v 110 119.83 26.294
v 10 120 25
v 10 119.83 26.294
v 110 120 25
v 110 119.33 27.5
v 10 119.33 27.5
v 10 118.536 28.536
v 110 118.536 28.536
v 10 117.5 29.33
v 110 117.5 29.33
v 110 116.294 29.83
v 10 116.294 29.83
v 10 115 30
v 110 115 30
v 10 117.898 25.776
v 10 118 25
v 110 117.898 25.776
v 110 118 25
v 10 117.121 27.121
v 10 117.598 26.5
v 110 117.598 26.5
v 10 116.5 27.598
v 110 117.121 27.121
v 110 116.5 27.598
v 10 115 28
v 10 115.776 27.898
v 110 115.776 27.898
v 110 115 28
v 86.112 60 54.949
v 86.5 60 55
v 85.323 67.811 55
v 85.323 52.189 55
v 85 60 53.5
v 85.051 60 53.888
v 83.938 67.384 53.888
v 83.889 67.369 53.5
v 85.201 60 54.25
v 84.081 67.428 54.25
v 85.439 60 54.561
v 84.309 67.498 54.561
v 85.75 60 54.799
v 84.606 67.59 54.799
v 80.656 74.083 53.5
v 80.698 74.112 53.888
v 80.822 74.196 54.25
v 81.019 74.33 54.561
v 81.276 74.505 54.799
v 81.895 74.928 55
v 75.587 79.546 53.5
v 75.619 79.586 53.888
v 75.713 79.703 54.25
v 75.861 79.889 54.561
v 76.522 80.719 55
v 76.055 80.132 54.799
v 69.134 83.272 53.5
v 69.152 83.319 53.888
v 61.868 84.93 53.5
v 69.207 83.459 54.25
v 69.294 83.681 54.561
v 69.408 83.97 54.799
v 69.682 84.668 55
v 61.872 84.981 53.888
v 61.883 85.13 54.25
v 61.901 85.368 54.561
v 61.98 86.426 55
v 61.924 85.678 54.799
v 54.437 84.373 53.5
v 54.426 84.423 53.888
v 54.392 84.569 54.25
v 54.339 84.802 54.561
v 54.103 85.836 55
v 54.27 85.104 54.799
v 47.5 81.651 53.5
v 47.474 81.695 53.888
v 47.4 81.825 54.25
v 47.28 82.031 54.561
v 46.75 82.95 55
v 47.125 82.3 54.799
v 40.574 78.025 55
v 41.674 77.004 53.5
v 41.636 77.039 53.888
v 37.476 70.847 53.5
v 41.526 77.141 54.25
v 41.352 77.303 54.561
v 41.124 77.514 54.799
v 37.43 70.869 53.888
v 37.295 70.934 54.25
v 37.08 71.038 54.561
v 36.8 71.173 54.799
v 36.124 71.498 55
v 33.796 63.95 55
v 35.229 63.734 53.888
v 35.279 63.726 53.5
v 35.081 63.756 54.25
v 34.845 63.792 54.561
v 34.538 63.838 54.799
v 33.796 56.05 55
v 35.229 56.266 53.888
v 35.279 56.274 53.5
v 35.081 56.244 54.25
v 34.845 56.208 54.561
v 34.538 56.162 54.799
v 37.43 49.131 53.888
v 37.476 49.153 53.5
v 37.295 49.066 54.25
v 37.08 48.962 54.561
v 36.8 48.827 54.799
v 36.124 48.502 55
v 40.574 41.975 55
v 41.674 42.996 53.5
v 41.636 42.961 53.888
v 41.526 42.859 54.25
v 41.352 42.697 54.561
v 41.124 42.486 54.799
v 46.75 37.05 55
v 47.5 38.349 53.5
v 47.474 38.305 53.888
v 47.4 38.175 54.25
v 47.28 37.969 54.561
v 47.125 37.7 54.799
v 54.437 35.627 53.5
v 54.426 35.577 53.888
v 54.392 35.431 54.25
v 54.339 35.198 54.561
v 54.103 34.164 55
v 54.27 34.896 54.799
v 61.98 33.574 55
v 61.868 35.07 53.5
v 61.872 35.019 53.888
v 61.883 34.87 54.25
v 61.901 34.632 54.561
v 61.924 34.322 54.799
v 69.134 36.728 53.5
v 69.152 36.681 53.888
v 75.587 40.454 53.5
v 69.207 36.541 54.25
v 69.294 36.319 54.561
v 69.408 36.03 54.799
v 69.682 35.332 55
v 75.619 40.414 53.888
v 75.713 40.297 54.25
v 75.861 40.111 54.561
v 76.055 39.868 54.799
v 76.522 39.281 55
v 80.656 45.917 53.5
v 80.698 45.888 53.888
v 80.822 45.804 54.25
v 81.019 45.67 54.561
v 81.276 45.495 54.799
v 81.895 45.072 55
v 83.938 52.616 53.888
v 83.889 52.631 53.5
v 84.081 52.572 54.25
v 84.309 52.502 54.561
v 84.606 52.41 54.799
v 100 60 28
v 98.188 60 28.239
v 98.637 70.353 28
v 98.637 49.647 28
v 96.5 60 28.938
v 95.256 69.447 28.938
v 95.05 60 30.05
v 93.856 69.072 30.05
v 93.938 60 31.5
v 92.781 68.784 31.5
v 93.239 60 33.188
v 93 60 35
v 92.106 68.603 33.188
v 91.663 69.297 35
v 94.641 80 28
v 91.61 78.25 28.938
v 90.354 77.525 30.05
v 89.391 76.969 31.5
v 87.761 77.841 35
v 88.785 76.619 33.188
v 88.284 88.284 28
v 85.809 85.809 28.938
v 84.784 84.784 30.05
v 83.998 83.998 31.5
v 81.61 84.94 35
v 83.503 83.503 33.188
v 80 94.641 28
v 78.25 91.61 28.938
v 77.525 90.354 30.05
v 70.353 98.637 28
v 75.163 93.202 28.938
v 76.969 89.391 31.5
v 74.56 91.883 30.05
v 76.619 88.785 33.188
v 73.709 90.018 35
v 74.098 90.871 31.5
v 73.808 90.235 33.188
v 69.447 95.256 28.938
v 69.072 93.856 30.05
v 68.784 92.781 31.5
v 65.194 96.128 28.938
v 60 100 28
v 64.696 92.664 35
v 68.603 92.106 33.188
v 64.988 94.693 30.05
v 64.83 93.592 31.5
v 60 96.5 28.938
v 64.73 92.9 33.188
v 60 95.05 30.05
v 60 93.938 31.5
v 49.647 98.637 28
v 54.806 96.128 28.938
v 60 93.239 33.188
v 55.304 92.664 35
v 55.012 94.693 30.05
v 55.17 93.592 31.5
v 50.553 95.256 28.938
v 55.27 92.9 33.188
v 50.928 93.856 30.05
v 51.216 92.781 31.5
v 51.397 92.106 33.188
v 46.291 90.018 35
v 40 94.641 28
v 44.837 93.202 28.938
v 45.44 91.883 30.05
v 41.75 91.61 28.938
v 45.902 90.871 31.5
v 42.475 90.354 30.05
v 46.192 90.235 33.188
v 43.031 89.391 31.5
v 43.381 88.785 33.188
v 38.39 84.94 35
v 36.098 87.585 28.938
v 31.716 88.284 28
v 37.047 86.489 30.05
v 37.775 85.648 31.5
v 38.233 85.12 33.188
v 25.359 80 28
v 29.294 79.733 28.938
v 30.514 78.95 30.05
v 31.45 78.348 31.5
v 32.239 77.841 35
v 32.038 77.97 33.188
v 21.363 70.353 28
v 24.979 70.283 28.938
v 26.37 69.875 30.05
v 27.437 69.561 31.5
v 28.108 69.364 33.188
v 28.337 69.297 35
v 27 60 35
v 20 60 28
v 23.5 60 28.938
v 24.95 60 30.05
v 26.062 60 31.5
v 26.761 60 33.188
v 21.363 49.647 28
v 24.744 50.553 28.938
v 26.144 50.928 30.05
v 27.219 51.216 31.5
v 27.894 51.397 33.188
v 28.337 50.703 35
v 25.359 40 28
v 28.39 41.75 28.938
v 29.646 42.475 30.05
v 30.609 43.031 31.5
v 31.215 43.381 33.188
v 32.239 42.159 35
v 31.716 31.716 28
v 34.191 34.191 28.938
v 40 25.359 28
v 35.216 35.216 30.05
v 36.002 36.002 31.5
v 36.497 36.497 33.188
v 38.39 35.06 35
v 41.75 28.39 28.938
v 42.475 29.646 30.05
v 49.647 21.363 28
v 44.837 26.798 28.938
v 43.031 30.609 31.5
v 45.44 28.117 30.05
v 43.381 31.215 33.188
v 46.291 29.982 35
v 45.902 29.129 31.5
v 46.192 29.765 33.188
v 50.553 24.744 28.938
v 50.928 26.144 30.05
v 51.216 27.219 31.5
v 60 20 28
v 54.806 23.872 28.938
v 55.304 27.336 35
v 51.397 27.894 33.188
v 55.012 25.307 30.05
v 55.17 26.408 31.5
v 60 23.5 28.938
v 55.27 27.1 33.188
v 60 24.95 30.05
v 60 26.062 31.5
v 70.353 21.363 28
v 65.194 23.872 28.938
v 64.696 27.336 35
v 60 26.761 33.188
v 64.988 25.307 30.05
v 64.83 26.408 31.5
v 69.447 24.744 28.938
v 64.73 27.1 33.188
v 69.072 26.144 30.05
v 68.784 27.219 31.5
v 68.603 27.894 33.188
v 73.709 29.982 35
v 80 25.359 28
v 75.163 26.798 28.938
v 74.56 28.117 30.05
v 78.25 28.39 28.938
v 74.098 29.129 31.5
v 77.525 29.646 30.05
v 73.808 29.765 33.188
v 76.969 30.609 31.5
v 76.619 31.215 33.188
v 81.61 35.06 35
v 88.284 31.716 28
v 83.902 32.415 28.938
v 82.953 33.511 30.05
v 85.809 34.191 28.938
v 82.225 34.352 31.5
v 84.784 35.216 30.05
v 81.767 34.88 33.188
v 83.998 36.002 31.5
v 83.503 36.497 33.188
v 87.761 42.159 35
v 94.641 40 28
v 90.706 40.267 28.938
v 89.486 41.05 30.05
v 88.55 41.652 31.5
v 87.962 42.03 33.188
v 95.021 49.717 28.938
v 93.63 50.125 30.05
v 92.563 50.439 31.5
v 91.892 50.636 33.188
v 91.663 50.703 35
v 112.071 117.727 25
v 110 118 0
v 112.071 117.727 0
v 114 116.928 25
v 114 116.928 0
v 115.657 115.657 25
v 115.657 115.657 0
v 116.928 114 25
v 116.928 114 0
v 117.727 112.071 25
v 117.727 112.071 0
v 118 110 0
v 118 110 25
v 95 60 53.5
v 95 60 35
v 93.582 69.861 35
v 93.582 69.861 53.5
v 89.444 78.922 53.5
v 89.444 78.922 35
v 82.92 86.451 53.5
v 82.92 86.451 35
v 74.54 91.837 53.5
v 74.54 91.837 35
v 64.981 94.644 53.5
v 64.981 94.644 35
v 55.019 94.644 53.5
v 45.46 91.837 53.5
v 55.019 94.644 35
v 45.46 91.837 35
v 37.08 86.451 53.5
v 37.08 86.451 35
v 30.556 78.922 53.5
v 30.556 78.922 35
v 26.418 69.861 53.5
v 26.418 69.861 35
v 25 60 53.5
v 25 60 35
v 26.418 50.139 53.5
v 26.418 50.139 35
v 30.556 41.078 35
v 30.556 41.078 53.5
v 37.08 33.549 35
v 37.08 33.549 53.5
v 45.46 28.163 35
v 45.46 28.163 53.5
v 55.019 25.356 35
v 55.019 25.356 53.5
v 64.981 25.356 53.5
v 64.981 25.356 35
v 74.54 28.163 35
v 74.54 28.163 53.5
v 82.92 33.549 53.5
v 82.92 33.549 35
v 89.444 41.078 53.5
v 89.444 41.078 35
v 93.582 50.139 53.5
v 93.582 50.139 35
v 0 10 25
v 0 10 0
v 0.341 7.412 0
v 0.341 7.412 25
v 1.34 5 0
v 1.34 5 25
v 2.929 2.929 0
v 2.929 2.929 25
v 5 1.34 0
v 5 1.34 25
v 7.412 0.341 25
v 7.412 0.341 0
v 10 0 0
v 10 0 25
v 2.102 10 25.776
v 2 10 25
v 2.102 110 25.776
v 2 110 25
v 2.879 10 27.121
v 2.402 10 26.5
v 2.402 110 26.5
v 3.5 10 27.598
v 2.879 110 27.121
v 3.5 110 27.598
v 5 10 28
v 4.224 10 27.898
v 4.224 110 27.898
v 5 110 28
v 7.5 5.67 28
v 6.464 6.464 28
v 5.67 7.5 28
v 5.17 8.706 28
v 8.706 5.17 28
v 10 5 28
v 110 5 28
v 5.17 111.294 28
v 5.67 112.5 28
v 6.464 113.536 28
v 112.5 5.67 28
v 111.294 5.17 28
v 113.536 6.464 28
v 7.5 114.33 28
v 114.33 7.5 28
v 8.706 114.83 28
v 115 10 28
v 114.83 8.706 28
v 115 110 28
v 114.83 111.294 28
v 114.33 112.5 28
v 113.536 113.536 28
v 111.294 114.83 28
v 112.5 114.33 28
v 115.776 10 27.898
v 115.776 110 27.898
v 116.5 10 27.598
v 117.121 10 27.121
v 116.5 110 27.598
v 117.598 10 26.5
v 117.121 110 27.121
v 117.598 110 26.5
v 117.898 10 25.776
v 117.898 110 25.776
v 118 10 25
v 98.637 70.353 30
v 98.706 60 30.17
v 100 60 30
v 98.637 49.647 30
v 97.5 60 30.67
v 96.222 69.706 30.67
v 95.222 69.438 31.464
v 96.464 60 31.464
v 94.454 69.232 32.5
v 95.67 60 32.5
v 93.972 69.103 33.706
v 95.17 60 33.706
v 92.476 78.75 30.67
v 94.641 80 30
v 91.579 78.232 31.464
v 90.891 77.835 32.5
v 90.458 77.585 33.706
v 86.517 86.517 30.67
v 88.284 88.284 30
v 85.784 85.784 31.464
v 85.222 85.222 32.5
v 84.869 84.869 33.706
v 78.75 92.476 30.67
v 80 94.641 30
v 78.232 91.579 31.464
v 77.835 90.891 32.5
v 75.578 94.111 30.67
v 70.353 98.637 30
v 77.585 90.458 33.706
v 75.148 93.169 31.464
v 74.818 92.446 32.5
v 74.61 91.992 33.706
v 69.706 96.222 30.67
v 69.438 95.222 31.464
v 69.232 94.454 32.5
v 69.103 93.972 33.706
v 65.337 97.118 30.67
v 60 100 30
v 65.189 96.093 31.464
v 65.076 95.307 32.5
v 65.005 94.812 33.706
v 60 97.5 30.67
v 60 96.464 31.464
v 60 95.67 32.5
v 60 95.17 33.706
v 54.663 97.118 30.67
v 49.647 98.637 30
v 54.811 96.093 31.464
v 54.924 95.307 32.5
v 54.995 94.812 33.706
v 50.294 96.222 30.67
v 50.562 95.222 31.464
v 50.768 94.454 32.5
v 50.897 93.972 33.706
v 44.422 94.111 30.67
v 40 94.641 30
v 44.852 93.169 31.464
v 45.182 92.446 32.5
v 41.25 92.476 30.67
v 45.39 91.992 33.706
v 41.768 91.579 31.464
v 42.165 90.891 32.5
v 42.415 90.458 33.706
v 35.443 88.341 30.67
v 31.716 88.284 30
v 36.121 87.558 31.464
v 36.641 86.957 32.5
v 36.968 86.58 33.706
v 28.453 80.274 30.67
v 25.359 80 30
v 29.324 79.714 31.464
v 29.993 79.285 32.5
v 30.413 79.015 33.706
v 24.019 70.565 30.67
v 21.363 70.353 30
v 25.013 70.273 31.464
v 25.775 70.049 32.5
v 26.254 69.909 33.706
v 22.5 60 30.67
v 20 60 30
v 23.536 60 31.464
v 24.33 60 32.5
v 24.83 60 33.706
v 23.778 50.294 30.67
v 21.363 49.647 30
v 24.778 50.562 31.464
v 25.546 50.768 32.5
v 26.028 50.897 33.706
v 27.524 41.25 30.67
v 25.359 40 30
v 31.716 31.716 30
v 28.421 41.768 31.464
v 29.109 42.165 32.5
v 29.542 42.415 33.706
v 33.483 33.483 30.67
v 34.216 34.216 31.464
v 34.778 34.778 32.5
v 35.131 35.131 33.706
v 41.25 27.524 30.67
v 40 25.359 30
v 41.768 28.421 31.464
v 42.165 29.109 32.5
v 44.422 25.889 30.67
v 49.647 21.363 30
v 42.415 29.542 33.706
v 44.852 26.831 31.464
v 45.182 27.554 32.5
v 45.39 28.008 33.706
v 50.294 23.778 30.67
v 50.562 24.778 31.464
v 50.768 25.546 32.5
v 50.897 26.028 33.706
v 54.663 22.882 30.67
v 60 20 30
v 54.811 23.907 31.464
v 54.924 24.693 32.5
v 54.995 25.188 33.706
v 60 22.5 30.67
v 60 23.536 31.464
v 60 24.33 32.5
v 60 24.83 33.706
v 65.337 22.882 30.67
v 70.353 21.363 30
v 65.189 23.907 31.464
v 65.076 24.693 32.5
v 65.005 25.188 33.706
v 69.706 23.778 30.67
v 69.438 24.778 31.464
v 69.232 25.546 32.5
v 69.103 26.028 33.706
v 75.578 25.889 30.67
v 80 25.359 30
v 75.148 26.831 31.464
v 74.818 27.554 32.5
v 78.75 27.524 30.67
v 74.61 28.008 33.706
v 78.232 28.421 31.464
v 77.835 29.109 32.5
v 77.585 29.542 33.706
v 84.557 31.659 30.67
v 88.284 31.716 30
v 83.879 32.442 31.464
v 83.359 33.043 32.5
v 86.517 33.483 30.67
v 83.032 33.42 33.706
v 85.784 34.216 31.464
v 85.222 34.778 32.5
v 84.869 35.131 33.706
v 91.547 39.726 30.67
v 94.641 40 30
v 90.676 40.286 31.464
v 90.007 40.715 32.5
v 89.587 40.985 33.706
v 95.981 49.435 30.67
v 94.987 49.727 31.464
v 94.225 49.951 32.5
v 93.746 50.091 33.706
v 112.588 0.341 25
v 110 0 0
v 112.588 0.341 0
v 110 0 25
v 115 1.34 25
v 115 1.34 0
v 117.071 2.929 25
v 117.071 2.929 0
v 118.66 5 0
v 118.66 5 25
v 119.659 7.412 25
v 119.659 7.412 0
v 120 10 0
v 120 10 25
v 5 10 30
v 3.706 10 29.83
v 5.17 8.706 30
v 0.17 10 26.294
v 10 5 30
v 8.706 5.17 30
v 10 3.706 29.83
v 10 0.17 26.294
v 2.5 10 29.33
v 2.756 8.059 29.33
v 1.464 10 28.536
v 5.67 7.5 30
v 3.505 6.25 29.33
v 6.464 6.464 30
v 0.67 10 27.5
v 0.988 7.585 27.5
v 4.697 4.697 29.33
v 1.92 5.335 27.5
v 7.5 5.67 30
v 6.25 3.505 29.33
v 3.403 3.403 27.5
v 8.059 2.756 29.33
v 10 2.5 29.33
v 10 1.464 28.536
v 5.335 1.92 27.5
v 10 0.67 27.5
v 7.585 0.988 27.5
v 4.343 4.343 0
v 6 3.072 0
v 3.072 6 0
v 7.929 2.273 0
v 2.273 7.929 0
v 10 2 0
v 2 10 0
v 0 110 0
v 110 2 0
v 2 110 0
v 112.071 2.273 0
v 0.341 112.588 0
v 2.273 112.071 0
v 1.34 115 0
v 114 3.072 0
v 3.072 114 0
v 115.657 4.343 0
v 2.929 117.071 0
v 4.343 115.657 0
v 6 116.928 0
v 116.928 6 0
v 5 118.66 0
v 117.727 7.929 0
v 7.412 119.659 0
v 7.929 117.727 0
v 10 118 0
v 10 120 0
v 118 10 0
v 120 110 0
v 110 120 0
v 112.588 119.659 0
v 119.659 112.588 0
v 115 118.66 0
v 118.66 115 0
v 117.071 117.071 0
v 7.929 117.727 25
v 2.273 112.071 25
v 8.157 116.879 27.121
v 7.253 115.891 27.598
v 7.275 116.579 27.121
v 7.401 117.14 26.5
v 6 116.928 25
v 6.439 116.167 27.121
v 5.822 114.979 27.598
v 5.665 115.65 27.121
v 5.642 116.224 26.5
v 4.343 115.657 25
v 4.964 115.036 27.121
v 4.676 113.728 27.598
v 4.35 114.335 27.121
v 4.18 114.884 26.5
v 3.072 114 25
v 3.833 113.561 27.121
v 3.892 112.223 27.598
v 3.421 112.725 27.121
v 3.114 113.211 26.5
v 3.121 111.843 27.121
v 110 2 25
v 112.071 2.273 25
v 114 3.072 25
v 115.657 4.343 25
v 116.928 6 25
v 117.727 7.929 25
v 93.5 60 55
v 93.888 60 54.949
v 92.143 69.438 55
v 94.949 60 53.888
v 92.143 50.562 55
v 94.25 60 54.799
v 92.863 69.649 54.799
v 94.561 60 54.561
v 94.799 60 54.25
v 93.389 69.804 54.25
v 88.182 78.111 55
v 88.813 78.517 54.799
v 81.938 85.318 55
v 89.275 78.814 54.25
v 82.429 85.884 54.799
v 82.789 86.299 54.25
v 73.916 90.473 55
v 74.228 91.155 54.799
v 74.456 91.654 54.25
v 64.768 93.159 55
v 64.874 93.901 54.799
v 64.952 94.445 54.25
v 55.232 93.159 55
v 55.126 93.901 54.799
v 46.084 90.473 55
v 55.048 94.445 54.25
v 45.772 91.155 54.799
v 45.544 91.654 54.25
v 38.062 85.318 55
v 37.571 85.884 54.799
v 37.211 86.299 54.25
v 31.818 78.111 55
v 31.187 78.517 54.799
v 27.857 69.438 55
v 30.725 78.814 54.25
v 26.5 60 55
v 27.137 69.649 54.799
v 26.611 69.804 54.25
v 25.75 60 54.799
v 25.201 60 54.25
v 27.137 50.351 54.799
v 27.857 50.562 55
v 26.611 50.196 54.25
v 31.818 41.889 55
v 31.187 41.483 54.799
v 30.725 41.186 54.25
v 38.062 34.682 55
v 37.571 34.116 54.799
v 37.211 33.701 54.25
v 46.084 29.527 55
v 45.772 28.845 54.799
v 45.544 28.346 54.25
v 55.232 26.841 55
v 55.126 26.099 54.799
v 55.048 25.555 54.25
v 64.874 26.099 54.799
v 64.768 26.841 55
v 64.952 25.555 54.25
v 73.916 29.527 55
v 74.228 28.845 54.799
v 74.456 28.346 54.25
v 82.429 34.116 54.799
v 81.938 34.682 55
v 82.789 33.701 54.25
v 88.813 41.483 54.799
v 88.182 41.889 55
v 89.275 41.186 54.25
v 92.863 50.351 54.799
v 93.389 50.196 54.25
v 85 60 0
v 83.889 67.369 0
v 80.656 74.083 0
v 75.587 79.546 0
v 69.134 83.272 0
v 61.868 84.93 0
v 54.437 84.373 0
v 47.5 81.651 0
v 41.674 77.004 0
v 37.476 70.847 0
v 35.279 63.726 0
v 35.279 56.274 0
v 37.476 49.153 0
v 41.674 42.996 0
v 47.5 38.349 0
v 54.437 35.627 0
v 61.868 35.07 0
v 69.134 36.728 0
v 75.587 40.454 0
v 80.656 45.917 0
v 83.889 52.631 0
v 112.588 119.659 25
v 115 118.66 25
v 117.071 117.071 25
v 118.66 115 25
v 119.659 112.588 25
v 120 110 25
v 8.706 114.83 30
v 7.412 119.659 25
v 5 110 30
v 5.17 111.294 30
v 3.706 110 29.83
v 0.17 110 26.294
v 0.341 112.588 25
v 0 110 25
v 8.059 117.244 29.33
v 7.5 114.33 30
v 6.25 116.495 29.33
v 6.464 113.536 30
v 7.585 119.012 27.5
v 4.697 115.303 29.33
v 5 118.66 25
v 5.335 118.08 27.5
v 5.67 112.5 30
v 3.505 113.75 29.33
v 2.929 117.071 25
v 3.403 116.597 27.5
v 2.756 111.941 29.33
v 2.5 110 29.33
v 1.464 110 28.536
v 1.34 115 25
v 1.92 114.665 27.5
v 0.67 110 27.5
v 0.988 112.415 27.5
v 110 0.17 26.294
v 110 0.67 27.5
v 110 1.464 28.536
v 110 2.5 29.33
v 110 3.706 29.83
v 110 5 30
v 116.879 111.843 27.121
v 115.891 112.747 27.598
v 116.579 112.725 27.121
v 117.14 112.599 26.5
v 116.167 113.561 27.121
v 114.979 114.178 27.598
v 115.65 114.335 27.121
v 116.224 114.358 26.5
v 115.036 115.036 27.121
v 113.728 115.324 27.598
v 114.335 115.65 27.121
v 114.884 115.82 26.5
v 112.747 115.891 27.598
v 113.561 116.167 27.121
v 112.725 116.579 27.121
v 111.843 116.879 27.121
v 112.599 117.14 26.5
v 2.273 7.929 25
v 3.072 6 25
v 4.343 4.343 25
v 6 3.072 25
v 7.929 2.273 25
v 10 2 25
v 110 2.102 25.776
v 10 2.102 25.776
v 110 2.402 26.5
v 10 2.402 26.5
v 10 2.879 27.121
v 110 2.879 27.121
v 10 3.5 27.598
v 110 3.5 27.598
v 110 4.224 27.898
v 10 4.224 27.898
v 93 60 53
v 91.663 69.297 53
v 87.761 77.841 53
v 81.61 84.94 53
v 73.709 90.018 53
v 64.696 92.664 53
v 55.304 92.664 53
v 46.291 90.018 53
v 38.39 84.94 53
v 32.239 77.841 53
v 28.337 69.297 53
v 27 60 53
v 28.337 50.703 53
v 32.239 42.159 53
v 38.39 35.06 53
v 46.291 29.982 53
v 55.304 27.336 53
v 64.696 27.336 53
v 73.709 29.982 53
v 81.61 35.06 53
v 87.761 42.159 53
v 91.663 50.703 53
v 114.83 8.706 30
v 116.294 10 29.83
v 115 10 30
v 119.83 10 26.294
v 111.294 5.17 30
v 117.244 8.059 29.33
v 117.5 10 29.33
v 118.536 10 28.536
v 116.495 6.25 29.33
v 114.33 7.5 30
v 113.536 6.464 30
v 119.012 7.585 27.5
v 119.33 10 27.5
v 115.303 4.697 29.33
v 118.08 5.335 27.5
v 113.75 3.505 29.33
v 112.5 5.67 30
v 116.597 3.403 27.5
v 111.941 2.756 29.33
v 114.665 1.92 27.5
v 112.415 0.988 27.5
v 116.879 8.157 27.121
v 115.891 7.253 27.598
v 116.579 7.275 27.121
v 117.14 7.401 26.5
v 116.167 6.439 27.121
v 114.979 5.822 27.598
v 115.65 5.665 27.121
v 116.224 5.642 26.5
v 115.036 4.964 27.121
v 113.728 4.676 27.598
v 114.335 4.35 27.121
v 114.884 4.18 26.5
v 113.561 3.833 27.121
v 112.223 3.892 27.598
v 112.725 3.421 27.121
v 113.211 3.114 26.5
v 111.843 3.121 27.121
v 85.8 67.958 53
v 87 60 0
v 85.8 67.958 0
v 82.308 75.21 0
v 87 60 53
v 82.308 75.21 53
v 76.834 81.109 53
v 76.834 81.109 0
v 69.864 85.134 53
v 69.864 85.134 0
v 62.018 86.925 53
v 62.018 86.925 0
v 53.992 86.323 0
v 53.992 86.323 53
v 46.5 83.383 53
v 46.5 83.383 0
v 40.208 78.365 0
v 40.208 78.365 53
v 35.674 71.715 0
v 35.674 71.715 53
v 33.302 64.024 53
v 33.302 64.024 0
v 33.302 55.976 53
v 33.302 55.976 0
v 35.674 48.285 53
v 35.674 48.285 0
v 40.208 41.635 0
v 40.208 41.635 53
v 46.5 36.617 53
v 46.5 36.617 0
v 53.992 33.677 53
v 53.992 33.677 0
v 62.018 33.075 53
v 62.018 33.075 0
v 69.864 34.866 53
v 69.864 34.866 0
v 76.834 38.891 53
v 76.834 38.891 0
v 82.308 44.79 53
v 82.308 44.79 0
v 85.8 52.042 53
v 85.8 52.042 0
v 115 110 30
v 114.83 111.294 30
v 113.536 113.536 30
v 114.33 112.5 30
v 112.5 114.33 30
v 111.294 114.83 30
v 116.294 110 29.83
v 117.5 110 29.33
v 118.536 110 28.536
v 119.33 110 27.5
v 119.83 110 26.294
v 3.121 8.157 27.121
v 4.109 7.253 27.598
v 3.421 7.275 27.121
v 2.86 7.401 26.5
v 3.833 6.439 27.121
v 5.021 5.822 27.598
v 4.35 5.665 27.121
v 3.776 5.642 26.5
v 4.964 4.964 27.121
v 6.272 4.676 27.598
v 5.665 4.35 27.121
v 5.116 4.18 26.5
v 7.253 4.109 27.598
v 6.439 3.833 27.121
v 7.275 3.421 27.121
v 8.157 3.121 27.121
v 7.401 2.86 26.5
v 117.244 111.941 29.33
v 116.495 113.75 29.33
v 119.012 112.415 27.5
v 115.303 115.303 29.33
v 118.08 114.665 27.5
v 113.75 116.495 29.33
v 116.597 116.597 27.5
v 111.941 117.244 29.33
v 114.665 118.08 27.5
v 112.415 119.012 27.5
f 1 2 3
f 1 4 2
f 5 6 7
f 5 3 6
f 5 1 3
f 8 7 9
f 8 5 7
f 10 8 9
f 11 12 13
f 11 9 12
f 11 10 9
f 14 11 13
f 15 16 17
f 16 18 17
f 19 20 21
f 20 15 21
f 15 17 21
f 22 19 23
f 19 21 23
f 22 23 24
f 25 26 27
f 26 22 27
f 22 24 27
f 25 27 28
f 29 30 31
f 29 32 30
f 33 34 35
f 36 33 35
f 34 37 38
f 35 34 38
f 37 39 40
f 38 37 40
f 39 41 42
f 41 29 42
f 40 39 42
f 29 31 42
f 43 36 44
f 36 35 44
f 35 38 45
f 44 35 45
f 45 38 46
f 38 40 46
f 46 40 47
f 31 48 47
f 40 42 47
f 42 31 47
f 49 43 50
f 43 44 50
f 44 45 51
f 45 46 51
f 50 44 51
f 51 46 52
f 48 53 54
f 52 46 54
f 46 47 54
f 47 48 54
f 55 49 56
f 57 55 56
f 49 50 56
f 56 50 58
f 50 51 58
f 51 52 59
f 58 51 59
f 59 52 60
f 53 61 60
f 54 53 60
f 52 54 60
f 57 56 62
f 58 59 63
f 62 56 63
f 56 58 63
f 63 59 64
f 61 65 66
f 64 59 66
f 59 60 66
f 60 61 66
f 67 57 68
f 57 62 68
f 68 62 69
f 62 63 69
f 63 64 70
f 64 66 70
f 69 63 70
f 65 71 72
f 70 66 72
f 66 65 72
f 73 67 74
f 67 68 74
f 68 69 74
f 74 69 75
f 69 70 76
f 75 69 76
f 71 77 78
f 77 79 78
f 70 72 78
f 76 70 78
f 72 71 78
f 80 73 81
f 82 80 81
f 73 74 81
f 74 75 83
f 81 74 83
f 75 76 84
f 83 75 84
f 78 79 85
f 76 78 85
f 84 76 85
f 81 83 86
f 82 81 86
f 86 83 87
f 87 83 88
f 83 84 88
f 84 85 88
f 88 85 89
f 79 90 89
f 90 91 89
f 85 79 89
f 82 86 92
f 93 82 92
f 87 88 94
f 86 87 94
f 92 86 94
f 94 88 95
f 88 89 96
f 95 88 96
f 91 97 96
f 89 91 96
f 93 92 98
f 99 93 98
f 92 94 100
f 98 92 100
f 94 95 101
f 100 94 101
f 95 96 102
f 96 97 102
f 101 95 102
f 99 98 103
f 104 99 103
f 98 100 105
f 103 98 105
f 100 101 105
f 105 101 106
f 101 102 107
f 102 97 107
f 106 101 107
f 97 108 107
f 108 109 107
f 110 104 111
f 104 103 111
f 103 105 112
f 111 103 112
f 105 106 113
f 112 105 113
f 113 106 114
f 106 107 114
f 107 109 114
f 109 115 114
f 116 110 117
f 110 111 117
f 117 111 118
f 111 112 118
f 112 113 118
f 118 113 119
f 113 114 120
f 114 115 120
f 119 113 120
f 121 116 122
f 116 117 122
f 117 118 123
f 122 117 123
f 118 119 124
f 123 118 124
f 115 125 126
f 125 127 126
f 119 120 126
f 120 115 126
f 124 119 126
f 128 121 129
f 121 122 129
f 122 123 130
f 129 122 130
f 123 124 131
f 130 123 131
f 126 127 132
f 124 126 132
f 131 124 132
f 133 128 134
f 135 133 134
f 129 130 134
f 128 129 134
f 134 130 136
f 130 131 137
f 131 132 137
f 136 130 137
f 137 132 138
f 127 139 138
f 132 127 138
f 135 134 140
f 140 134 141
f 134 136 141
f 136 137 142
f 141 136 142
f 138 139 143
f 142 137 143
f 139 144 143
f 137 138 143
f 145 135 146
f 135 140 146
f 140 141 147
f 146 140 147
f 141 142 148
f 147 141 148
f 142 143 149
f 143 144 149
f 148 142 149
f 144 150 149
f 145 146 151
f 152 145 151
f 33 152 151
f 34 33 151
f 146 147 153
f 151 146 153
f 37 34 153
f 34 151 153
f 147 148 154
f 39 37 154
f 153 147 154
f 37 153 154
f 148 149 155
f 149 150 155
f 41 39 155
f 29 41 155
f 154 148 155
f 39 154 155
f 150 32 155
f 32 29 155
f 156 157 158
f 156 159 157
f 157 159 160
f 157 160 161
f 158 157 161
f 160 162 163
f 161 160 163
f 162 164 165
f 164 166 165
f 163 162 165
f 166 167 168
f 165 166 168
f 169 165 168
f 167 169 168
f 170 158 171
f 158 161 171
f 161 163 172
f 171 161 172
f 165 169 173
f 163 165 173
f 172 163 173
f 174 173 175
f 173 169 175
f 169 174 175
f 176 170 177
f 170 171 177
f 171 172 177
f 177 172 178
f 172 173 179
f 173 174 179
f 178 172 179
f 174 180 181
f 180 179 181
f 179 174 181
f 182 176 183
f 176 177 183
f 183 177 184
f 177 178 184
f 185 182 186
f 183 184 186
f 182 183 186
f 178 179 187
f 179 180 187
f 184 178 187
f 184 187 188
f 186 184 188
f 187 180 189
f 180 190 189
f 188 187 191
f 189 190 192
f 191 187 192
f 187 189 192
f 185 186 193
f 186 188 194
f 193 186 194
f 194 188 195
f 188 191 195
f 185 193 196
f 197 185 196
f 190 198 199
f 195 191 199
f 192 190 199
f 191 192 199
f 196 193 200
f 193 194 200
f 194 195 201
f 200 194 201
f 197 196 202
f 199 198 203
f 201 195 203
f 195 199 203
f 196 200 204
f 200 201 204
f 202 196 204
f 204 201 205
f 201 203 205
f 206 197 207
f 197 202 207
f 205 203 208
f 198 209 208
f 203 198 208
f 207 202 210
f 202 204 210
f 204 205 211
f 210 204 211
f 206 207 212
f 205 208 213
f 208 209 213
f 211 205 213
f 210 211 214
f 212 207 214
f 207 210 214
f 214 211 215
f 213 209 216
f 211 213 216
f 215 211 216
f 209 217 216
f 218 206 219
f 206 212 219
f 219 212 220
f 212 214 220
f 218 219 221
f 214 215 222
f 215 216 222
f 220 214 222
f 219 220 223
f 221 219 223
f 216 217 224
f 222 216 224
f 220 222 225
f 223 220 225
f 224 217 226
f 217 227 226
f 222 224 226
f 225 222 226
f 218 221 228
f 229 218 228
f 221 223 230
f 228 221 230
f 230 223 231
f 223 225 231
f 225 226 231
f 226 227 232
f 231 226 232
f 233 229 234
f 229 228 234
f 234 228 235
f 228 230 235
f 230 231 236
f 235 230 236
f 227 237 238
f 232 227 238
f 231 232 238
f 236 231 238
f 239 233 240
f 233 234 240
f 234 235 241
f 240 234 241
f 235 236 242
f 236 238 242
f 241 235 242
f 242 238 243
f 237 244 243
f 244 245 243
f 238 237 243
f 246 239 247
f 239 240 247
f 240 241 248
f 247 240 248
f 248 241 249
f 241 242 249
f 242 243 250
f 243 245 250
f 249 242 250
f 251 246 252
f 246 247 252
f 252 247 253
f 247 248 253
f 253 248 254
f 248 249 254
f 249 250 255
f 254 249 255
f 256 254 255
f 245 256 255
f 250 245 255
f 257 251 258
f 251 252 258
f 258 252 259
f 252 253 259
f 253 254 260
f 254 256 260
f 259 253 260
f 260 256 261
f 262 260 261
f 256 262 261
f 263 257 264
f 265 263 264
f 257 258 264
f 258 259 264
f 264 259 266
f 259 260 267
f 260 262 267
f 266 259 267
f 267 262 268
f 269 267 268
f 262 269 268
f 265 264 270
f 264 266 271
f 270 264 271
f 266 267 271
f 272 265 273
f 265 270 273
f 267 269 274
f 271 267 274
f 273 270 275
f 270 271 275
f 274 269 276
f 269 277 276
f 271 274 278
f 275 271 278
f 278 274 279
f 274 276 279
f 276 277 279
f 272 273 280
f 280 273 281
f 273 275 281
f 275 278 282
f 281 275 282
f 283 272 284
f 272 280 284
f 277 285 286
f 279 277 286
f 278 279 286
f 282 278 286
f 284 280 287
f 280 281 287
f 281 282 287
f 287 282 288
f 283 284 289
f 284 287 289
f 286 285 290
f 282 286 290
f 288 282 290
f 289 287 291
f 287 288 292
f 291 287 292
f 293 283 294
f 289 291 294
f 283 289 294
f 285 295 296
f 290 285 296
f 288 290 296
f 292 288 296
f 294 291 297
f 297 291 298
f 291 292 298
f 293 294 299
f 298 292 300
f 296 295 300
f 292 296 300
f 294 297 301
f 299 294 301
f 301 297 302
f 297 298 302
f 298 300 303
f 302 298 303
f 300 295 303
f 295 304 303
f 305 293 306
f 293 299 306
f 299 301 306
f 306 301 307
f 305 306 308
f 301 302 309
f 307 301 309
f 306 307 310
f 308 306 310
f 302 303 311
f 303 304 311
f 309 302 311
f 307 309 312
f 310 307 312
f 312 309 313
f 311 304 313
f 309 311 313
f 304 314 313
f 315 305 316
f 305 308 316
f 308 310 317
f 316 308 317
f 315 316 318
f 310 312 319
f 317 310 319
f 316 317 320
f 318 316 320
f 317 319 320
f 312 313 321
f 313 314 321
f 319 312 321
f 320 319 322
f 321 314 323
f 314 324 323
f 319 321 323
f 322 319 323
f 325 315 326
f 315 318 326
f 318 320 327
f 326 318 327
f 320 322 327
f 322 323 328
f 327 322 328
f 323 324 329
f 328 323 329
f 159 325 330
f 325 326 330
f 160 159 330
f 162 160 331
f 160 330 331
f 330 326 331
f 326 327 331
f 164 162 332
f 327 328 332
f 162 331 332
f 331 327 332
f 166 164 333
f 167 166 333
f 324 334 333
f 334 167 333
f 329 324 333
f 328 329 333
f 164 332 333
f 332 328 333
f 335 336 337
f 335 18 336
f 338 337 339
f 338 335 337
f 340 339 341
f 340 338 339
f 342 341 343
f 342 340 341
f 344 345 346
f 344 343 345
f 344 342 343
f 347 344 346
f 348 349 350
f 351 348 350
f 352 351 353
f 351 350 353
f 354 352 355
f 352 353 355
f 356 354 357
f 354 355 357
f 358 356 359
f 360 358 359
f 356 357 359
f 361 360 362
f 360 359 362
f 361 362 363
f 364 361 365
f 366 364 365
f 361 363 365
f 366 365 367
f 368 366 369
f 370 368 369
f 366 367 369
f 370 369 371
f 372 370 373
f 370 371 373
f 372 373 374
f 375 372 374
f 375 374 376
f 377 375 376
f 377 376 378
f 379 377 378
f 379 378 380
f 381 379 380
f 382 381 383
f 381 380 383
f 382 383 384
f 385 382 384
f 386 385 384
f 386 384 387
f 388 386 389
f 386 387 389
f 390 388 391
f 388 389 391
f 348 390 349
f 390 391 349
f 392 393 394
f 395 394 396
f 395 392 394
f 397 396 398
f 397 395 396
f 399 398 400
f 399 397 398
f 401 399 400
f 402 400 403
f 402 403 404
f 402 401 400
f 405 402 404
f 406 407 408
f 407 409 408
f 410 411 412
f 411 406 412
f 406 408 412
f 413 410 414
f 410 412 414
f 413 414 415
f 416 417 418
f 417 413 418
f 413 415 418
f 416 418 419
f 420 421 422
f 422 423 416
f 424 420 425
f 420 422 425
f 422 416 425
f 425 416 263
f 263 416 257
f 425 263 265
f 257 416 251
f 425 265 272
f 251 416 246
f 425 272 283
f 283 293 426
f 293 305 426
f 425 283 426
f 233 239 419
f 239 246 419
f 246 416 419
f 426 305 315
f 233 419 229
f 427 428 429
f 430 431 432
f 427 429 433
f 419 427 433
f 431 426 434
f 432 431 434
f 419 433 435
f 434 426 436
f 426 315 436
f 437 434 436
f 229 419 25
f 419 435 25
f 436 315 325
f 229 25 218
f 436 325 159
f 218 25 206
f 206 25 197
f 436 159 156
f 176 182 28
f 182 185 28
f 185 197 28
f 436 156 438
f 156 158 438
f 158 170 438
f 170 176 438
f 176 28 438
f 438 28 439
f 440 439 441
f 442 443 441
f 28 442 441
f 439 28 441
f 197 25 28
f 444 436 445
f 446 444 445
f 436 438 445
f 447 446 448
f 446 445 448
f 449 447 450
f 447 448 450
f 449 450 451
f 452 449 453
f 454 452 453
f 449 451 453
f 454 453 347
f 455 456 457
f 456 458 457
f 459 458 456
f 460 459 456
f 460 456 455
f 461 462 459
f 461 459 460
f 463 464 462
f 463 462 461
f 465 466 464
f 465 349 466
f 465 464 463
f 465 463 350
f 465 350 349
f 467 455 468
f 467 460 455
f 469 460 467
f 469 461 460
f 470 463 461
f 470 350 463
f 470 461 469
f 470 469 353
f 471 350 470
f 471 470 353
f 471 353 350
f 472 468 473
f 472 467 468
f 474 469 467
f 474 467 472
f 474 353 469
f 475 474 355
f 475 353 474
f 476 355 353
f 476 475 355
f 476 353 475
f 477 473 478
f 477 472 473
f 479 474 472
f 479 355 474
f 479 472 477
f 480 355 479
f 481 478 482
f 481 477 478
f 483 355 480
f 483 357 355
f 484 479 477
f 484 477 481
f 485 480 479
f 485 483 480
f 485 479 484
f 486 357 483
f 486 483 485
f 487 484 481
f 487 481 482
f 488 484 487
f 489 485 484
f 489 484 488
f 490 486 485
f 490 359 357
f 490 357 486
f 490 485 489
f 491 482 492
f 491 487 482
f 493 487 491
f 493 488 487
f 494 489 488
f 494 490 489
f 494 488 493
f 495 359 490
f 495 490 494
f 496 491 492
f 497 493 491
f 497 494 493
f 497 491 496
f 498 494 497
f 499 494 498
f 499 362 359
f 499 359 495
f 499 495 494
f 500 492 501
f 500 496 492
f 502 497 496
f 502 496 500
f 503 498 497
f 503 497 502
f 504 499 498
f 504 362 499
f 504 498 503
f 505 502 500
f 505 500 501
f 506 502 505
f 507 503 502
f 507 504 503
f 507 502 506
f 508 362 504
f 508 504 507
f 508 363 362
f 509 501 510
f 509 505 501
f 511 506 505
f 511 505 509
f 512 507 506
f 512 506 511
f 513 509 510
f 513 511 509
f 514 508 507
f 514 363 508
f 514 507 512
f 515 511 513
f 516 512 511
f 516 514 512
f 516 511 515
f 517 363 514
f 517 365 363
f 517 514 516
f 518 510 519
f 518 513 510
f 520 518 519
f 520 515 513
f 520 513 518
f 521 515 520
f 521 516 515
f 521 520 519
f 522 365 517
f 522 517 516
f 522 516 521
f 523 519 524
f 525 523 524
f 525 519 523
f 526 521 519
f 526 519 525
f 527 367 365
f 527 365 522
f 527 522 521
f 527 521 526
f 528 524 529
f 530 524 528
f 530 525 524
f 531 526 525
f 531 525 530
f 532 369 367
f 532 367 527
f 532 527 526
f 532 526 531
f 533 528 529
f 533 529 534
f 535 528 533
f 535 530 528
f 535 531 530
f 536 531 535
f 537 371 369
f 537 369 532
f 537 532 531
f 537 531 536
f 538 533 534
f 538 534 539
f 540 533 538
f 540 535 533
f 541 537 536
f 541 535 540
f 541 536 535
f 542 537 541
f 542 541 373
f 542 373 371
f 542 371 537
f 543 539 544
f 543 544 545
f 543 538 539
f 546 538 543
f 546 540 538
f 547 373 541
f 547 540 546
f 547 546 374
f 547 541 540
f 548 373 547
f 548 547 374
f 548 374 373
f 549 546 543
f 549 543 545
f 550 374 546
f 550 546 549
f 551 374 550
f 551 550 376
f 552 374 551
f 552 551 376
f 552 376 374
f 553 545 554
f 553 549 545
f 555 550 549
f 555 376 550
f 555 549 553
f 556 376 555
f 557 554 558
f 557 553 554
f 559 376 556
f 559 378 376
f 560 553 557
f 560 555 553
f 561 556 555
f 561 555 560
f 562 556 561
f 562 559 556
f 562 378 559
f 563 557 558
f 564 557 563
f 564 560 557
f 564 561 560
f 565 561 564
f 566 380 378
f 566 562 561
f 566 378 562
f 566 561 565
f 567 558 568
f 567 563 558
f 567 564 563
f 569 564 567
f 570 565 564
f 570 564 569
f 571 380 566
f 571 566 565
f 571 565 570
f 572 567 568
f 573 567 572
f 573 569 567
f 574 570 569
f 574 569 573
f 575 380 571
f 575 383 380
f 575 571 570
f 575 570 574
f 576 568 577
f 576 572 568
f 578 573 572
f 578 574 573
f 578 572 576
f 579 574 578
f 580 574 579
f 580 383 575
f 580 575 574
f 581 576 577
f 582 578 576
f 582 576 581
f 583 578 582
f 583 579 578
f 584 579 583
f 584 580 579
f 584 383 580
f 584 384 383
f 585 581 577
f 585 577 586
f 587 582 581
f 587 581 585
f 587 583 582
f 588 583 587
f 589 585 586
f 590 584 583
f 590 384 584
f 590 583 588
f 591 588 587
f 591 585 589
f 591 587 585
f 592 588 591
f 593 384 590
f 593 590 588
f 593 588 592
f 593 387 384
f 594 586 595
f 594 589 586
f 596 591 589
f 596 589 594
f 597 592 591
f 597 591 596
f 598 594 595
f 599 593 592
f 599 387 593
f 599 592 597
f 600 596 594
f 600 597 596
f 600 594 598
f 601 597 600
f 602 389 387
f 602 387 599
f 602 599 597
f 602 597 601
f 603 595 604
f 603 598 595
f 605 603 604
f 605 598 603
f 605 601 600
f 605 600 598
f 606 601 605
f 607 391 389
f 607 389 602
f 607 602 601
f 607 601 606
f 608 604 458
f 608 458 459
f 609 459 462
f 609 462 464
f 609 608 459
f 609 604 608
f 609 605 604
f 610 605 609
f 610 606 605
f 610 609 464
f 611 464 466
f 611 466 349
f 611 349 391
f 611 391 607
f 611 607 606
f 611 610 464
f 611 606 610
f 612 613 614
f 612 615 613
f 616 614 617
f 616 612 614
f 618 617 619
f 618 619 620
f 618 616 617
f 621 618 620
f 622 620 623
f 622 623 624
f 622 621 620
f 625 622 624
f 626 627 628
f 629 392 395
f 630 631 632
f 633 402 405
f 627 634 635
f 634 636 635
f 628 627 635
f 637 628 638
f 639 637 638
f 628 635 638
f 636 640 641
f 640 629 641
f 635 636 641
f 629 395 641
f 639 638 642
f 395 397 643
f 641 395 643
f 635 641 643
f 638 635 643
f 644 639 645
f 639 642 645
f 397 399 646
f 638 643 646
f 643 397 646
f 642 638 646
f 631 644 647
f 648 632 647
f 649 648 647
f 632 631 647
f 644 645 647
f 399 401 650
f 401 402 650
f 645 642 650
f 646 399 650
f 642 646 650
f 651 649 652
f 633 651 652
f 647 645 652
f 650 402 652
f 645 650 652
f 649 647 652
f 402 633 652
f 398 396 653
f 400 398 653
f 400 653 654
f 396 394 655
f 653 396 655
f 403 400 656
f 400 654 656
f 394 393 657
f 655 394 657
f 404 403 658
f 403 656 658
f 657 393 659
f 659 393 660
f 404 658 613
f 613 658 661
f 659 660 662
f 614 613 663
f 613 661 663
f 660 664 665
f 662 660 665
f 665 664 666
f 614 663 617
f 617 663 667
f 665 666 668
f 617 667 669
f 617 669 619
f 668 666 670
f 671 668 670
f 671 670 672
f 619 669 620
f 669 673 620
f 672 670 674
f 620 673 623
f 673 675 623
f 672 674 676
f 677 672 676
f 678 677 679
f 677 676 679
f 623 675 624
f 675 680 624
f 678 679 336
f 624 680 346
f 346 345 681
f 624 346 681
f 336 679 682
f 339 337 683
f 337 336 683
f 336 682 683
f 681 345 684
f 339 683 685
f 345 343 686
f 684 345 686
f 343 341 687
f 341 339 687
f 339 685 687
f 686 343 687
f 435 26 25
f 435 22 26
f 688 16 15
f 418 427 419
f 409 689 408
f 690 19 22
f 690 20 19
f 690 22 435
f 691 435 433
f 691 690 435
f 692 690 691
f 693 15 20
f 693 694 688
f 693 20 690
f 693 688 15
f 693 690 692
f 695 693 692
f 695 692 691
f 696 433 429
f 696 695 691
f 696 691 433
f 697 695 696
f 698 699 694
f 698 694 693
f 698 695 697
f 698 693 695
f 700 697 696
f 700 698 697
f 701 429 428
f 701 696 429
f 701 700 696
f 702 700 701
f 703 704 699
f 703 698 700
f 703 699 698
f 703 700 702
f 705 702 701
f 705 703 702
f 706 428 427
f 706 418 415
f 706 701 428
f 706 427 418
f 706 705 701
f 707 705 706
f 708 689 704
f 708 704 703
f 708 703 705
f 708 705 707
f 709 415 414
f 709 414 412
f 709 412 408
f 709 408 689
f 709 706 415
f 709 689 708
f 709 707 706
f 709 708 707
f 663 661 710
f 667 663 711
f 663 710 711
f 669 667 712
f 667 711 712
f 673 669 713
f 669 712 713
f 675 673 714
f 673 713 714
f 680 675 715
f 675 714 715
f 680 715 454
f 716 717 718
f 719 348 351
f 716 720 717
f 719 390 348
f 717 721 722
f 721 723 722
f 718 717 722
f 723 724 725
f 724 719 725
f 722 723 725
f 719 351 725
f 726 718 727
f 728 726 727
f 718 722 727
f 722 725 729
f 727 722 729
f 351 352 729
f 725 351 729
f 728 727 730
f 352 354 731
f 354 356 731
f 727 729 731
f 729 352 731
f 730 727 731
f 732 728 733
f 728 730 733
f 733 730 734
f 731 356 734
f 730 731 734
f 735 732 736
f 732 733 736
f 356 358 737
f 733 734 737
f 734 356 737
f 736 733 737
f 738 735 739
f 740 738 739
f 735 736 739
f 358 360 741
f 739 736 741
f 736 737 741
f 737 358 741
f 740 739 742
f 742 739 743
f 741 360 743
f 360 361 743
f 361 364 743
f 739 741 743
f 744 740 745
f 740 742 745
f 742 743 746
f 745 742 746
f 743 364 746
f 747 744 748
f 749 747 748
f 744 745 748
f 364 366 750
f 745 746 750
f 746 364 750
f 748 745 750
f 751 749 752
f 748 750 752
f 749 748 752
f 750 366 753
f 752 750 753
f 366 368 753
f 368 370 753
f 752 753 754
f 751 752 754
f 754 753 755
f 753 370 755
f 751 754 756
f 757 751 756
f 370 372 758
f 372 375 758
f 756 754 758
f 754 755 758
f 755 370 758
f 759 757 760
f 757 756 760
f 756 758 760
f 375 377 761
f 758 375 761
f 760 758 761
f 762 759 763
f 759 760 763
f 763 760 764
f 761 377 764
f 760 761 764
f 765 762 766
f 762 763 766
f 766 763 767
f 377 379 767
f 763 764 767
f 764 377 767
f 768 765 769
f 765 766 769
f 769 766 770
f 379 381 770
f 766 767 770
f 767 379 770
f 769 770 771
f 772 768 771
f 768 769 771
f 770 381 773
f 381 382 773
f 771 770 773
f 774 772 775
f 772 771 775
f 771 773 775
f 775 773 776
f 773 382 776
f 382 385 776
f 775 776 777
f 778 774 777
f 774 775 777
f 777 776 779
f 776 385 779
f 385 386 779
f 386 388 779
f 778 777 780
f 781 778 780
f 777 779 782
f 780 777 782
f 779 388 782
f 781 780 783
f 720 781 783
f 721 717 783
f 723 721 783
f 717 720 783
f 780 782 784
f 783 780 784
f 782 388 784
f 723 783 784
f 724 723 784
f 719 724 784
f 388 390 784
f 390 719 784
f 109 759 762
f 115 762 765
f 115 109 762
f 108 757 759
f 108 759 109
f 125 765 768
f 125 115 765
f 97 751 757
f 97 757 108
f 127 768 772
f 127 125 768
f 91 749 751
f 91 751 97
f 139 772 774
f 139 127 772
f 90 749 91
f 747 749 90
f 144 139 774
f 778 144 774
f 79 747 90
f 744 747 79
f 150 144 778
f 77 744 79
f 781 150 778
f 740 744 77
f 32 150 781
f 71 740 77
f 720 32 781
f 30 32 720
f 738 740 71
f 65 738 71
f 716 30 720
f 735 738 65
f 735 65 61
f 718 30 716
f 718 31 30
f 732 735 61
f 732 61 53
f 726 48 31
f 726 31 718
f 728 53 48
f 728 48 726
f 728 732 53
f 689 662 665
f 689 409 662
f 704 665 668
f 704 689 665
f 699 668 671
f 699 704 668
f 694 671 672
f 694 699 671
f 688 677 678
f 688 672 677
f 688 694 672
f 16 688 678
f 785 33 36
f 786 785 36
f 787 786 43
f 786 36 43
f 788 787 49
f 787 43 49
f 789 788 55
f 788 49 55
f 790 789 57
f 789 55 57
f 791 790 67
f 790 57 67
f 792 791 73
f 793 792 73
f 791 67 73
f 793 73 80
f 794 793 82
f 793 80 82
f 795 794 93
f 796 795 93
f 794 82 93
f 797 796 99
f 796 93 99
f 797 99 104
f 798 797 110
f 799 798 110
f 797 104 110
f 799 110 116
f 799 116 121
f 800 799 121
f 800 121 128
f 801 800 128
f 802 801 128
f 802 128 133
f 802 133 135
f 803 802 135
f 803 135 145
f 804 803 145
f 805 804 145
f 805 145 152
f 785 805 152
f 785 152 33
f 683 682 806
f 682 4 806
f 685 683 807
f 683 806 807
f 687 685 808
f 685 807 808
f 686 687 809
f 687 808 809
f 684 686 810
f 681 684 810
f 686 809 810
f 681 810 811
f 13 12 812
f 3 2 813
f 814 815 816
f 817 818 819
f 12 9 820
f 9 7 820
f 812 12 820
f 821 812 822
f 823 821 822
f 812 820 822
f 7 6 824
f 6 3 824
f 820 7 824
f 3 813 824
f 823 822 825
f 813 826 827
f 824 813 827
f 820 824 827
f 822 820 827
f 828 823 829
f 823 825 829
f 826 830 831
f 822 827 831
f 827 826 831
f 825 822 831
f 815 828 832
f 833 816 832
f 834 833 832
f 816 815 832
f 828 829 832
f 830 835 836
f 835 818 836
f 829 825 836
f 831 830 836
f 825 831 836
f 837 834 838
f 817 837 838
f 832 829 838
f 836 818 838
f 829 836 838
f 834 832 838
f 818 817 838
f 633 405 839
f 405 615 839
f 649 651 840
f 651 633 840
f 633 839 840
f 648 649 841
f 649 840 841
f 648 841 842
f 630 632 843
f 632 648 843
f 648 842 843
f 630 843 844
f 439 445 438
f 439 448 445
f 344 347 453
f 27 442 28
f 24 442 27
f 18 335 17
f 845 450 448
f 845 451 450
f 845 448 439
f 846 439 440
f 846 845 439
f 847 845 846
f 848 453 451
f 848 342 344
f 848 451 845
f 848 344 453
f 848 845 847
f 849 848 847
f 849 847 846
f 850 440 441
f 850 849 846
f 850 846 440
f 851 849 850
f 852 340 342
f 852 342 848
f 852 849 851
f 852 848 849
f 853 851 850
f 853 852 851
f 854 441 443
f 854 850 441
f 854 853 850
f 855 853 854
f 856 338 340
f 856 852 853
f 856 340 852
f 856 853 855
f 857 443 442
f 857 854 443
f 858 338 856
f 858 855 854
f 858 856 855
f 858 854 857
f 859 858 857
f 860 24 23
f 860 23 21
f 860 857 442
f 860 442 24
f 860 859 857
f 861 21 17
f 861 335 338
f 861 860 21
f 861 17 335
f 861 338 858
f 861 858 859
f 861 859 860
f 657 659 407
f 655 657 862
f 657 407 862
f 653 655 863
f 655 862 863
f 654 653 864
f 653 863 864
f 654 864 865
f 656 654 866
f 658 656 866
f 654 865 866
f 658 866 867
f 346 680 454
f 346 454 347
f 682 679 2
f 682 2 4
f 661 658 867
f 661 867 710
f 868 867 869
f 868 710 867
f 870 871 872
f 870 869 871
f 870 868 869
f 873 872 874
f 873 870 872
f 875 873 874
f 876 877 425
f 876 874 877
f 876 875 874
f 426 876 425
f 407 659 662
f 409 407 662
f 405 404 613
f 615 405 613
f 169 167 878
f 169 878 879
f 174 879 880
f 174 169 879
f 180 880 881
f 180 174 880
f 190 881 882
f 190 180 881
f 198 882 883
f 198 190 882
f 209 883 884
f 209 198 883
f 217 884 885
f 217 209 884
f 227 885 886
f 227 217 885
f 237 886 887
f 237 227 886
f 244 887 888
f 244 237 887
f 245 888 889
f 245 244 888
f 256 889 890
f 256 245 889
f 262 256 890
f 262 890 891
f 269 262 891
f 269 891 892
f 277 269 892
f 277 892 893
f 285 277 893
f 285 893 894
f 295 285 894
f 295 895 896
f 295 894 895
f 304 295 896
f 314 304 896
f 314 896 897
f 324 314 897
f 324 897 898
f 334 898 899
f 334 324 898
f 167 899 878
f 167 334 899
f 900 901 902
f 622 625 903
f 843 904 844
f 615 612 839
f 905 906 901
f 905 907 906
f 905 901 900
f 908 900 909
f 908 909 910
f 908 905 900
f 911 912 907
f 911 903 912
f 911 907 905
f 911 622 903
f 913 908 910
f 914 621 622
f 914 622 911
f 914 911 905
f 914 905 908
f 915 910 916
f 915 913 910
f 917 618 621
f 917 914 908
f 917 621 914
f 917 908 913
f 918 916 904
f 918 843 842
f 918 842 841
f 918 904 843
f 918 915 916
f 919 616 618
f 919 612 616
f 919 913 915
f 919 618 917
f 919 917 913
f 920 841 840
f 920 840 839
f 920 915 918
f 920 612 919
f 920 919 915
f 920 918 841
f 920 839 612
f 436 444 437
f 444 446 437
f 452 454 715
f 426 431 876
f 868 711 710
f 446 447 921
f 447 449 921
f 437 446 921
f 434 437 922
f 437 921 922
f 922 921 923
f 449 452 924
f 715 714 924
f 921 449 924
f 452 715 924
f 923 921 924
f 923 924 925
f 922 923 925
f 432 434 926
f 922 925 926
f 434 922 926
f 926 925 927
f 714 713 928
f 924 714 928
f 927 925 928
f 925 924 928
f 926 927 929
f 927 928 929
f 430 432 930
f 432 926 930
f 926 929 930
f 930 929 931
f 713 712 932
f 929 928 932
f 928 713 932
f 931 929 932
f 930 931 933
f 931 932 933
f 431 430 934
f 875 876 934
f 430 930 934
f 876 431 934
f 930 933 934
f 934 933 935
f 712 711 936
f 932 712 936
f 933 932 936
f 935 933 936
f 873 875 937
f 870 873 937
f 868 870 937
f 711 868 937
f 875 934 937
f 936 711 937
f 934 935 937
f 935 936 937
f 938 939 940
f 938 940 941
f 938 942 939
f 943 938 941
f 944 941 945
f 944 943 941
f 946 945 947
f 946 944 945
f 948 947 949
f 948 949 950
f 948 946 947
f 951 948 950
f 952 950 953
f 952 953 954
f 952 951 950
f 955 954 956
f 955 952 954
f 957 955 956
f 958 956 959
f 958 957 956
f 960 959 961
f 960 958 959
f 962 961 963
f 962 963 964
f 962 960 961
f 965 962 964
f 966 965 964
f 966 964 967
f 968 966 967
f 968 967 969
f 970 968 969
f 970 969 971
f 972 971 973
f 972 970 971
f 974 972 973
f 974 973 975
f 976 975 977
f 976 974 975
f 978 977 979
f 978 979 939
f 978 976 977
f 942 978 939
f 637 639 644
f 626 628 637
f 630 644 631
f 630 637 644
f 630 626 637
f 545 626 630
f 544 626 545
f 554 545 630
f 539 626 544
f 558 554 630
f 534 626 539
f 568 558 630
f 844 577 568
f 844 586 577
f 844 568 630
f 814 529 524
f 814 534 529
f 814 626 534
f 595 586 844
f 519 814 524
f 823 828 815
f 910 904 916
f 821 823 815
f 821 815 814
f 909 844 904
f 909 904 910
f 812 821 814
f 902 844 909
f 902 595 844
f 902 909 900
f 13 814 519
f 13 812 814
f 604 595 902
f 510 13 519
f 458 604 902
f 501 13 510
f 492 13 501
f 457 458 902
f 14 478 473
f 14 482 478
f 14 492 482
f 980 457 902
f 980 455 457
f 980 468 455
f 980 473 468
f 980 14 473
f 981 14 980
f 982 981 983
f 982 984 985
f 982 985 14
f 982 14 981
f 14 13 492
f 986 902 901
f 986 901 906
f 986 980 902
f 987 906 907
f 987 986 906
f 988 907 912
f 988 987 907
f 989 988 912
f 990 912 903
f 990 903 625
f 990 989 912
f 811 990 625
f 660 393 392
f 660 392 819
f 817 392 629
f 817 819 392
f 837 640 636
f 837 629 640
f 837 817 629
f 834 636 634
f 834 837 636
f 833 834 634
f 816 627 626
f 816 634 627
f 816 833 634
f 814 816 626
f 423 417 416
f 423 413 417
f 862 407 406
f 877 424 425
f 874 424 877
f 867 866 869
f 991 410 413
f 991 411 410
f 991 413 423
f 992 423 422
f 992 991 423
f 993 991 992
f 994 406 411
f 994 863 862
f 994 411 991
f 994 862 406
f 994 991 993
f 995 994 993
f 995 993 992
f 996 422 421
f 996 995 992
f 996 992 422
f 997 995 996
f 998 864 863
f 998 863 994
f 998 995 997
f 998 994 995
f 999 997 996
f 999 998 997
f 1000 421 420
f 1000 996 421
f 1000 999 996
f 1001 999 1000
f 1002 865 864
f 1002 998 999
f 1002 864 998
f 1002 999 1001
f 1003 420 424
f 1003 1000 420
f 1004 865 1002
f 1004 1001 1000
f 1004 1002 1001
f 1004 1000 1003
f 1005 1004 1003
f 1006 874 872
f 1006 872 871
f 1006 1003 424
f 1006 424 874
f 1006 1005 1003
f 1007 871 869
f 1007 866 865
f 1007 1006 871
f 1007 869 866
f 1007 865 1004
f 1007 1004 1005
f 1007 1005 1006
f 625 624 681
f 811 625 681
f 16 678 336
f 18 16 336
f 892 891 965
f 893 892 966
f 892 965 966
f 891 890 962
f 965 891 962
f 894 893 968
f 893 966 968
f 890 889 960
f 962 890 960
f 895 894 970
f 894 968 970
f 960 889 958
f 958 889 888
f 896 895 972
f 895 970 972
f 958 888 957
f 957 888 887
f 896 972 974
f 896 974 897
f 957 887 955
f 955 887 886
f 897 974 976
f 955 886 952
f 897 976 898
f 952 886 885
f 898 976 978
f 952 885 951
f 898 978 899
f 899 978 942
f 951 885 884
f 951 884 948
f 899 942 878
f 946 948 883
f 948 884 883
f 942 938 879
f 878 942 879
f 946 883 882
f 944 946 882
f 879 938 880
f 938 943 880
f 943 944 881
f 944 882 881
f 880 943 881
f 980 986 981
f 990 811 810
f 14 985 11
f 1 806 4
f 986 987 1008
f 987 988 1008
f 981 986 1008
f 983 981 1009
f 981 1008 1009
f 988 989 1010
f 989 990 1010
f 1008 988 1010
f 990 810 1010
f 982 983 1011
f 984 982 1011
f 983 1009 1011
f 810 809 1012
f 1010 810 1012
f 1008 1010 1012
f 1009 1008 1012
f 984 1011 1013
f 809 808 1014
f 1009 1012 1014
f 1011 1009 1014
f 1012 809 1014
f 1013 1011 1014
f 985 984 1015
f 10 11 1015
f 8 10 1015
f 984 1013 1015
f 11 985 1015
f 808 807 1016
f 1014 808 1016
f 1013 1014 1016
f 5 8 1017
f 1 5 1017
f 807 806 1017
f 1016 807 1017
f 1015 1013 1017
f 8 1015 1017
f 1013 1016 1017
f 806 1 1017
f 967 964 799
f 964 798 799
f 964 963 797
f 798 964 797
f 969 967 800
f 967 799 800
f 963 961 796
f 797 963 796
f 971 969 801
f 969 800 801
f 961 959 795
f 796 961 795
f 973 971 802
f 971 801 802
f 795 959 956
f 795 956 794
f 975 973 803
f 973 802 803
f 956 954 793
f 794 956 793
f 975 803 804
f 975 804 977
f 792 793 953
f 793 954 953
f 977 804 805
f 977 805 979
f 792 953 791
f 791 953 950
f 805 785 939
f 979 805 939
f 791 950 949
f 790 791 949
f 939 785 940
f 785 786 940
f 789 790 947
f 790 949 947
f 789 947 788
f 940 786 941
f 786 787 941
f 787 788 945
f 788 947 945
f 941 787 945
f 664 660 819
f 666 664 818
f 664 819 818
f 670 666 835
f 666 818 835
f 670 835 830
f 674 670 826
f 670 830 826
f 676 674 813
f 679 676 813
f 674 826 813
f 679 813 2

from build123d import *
from OCP.BRepFilletAPI import BRepFilletAPI_MakeFillet

# Parameters (mm, degrees)
SKETCH1_W           = 120
SKETCH1_H           = 120
BOSS_EXTRUDE1_DEPTH = 30
SKETCH3_R           = 35
BOSS_EXTRUDE2_DEPTH = 25
SKETCH4_R           = 25
CUT_EXTRUDE1_DEPTH  = 179.395627749
FILLET1_R1          = 5
FILLET1_R2          = 10
FILLET2_R           = 1.5
SHELL1_T            = -2


with BuildPart() as part:
    # Sketch1 → Boss-Extrude1 (new body)
    with BuildSketch(Plane.XY):
        with Locations((60, 60)):
            Rectangle(SKETCH1_W, SKETCH1_H)
    extrude(amount=BOSS_EXTRUDE1_DEPTH)

    # Sketch3 → Boss-Extrude2 (add)
    with BuildSketch(Plane.XY.offset(30)):
        with Locations((60, 60)):
            Circle(SKETCH3_R)
    extrude(amount=BOSS_EXTRUDE2_DEPTH)

    # Sketch4 → Cut-Extrude1 (cut, through all)
    with BuildSketch(Plane.XY.offset(55)):
        with Locations((60, 60)):
            Circle(SKETCH4_R)
    extrude(amount=-CUT_EXTRUDE1_DEPTH, mode=Mode.SUBTRACT)

    # Fillet1: one fillet with a radius per group of edges: ONE call of the kernel's fillet builder (fillet() takes one radius for all edges)
    fillet1_edges_1 = [part.edges().sort_by_distance(p)[0] for p in [
        (120, 60, 30),
        (25, 60, 30),
        (60, 120, 30),
        (0, 60, 30),
        (60, 0, 30),
    ]]
    fillet1_edges_2 = [part.edges().sort_by_distance(p)[0] for p in [
        (0, 120, 15),
        (120, 120, 15),
        (120, 0, 15),
        (0, 0, 15),
    ]]
    fillet1 = BRepFilletAPI_MakeFillet(part.part.solid().wrapped)
    for e in fillet1_edges_1:
        fillet1.Add(FILLET1_R1, e.wrapped)
    for e in fillet1_edges_2:
        fillet1.Add(FILLET1_R2, e.wrapped)
    add(Compound.cast(fillet1.Shape()), mode=Mode.REPLACE)

    # Fillet2
    fillet2_edges = [part.edges().sort_by_distance(p)[0] for p in [
        (25, 60, 55),
        (35, 60, 55),
    ]]
    fillet(fillet2_edges, radius=FILLET2_R)

    # Shell1
    shell1_openings = [part.faces().sort_by_distance(p)[0] for p in [
        (60, 118.302943725, 0),
    ]]
    offset(amount=SHELL1_T, openings=shell1_openings, kind=Kind.INTERSECTION)


solid = part.part
